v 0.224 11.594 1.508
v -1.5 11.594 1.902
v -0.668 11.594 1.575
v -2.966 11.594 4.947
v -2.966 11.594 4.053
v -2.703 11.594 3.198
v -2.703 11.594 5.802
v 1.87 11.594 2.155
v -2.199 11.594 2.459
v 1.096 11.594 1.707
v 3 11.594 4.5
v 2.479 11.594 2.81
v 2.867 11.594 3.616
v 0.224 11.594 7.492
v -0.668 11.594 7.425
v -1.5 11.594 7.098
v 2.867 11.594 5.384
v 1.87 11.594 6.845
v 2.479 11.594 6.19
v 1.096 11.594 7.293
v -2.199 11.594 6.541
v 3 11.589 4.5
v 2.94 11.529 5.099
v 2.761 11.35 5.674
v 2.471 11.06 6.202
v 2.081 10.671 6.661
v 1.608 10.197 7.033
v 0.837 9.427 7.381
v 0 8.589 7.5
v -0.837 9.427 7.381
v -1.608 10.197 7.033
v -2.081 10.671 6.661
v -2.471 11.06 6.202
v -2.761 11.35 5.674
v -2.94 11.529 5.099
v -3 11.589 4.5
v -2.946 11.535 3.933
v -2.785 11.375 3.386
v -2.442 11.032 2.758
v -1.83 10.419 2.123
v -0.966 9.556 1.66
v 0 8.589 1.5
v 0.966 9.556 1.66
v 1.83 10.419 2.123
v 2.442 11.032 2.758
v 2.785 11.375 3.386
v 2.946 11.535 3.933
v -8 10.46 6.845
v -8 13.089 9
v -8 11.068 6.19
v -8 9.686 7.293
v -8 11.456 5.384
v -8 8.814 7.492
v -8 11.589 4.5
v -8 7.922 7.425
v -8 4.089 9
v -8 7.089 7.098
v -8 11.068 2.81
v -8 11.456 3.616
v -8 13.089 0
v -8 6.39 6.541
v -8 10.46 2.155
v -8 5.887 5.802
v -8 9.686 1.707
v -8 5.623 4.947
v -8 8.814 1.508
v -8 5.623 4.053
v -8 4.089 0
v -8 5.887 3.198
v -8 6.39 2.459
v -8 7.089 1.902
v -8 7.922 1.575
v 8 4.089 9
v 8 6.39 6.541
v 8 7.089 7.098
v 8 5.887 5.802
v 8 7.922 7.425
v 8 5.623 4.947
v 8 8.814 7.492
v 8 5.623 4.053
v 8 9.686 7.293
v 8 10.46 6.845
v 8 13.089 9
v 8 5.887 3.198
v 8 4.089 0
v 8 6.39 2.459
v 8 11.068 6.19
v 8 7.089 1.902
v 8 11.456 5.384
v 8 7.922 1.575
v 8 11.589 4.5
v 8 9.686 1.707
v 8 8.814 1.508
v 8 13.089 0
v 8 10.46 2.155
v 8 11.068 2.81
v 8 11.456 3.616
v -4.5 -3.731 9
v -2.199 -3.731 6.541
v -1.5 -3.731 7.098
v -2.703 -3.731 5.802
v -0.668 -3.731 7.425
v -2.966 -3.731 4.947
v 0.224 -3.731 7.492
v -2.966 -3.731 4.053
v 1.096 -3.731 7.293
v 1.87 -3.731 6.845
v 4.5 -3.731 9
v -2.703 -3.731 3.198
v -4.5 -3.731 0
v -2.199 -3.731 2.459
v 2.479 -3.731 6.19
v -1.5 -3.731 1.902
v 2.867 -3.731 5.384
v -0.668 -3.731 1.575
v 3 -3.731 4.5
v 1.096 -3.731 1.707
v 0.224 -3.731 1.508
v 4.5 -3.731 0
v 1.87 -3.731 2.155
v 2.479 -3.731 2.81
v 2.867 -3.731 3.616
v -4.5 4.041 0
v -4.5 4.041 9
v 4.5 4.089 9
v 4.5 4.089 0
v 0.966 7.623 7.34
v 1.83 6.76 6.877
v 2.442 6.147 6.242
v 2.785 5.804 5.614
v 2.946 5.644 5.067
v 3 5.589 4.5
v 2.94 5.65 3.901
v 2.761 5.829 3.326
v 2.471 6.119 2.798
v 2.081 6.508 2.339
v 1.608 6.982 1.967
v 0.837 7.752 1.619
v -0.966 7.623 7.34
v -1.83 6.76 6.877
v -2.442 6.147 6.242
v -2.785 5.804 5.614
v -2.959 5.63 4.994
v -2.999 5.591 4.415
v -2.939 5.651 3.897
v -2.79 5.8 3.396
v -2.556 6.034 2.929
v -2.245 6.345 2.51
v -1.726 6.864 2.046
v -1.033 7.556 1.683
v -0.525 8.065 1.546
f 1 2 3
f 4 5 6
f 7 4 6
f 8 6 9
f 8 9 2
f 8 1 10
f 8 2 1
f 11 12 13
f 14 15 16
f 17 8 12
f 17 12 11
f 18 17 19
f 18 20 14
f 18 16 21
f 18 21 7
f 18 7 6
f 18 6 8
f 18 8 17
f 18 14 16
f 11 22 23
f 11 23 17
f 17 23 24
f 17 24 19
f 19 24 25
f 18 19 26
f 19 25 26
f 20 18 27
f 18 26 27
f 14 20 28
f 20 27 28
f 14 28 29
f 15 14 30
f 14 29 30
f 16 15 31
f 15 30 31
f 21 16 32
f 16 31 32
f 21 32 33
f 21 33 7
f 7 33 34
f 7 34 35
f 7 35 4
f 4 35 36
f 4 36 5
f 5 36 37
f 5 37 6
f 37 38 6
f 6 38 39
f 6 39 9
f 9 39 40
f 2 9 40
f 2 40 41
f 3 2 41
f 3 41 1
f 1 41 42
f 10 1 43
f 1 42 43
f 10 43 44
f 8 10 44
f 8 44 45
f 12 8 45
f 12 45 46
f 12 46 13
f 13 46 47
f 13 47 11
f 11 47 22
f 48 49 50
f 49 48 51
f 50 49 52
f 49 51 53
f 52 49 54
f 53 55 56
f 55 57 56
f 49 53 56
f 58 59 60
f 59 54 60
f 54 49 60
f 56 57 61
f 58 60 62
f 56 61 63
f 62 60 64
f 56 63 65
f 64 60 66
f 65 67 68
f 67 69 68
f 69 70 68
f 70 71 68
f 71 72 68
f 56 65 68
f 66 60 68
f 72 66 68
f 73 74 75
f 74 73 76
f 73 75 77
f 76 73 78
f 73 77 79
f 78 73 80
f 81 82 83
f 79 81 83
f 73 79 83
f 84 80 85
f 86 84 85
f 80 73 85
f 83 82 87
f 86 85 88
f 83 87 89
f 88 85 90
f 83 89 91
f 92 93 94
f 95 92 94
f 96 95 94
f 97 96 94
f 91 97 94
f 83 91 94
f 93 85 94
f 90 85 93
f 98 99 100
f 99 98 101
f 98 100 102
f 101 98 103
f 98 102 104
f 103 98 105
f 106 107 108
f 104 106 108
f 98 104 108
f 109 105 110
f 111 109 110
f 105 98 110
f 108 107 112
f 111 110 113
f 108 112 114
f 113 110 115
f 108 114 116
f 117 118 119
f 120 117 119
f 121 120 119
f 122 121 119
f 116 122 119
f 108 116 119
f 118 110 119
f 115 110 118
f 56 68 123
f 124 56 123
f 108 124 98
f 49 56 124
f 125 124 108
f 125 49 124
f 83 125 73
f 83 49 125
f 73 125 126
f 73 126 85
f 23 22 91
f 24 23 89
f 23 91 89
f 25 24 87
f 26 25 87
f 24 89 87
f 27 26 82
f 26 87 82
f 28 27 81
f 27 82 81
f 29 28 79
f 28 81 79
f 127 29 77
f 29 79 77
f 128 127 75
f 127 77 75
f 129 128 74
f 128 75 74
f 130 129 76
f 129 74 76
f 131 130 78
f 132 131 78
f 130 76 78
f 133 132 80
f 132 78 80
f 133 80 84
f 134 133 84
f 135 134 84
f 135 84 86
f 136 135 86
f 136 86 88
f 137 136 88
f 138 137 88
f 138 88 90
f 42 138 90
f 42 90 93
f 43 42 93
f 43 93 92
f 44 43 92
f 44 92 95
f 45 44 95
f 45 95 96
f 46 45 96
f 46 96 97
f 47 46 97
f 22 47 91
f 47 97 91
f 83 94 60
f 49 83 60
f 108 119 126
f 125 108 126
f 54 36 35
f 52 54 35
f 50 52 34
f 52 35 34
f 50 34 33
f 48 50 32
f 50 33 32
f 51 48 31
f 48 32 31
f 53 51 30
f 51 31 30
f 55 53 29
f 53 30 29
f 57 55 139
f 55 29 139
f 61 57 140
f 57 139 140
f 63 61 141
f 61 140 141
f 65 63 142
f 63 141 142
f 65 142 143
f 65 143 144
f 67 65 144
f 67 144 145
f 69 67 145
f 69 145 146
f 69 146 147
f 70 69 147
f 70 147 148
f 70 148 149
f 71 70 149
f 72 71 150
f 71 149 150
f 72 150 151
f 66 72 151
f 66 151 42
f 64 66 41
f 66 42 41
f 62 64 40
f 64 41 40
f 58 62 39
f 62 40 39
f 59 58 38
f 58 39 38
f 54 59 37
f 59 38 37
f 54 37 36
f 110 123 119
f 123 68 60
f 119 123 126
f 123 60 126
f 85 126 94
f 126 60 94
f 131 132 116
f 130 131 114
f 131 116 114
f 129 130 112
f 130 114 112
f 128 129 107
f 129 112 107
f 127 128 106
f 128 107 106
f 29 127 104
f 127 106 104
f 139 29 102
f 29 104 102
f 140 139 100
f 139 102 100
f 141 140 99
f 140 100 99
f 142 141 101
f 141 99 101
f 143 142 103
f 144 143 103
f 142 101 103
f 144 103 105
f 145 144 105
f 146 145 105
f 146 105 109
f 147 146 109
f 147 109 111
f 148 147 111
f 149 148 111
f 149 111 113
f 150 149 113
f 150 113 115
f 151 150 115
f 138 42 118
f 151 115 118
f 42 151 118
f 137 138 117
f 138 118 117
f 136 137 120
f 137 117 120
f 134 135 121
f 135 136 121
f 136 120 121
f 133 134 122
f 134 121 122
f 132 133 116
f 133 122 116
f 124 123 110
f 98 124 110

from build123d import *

# Parameters (mm, degrees)
F1_DEPTH = 9
F3_R     = 3
F4_DEPTH = 16
F2_R     = 3
F5_DEPTH = 15.325


with BuildPart() as f1:
    # F0 (on Top) → F1 (new body)
    with BuildSketch(Plane.XY):
        Polygon((8, 13.089484), (0, 13.089484), (-8, 13.089484), (-8, 4.089484), (-4.5, 4.041417), (-4.5, -3.731445), (0, -3.731445), (4.5, -3.731445), (4.5, 4.089484), (8, 4.089484), align=None)
    extrude(amount=F1_DEPTH)

    # F3 (on face) → F4 (cut)
    with BuildSketch(Plane.YZ.offset(8)):
        with Locations((8.589484, 4.5)):
            Circle(F3_R)
    extrude(amount=-F4_DEPTH, mode=Mode.SUBTRACT)

    # F2 (on face) → F5 (cut)
    with BuildSketch(Plane.XZ.offset(3.731445)):
        with Locations((0, 4.5)):
            Circle(F2_R)
    extrude(amount=-F5_DEPTH, mode=Mode.SUBTRACT)


solid = f1.part
